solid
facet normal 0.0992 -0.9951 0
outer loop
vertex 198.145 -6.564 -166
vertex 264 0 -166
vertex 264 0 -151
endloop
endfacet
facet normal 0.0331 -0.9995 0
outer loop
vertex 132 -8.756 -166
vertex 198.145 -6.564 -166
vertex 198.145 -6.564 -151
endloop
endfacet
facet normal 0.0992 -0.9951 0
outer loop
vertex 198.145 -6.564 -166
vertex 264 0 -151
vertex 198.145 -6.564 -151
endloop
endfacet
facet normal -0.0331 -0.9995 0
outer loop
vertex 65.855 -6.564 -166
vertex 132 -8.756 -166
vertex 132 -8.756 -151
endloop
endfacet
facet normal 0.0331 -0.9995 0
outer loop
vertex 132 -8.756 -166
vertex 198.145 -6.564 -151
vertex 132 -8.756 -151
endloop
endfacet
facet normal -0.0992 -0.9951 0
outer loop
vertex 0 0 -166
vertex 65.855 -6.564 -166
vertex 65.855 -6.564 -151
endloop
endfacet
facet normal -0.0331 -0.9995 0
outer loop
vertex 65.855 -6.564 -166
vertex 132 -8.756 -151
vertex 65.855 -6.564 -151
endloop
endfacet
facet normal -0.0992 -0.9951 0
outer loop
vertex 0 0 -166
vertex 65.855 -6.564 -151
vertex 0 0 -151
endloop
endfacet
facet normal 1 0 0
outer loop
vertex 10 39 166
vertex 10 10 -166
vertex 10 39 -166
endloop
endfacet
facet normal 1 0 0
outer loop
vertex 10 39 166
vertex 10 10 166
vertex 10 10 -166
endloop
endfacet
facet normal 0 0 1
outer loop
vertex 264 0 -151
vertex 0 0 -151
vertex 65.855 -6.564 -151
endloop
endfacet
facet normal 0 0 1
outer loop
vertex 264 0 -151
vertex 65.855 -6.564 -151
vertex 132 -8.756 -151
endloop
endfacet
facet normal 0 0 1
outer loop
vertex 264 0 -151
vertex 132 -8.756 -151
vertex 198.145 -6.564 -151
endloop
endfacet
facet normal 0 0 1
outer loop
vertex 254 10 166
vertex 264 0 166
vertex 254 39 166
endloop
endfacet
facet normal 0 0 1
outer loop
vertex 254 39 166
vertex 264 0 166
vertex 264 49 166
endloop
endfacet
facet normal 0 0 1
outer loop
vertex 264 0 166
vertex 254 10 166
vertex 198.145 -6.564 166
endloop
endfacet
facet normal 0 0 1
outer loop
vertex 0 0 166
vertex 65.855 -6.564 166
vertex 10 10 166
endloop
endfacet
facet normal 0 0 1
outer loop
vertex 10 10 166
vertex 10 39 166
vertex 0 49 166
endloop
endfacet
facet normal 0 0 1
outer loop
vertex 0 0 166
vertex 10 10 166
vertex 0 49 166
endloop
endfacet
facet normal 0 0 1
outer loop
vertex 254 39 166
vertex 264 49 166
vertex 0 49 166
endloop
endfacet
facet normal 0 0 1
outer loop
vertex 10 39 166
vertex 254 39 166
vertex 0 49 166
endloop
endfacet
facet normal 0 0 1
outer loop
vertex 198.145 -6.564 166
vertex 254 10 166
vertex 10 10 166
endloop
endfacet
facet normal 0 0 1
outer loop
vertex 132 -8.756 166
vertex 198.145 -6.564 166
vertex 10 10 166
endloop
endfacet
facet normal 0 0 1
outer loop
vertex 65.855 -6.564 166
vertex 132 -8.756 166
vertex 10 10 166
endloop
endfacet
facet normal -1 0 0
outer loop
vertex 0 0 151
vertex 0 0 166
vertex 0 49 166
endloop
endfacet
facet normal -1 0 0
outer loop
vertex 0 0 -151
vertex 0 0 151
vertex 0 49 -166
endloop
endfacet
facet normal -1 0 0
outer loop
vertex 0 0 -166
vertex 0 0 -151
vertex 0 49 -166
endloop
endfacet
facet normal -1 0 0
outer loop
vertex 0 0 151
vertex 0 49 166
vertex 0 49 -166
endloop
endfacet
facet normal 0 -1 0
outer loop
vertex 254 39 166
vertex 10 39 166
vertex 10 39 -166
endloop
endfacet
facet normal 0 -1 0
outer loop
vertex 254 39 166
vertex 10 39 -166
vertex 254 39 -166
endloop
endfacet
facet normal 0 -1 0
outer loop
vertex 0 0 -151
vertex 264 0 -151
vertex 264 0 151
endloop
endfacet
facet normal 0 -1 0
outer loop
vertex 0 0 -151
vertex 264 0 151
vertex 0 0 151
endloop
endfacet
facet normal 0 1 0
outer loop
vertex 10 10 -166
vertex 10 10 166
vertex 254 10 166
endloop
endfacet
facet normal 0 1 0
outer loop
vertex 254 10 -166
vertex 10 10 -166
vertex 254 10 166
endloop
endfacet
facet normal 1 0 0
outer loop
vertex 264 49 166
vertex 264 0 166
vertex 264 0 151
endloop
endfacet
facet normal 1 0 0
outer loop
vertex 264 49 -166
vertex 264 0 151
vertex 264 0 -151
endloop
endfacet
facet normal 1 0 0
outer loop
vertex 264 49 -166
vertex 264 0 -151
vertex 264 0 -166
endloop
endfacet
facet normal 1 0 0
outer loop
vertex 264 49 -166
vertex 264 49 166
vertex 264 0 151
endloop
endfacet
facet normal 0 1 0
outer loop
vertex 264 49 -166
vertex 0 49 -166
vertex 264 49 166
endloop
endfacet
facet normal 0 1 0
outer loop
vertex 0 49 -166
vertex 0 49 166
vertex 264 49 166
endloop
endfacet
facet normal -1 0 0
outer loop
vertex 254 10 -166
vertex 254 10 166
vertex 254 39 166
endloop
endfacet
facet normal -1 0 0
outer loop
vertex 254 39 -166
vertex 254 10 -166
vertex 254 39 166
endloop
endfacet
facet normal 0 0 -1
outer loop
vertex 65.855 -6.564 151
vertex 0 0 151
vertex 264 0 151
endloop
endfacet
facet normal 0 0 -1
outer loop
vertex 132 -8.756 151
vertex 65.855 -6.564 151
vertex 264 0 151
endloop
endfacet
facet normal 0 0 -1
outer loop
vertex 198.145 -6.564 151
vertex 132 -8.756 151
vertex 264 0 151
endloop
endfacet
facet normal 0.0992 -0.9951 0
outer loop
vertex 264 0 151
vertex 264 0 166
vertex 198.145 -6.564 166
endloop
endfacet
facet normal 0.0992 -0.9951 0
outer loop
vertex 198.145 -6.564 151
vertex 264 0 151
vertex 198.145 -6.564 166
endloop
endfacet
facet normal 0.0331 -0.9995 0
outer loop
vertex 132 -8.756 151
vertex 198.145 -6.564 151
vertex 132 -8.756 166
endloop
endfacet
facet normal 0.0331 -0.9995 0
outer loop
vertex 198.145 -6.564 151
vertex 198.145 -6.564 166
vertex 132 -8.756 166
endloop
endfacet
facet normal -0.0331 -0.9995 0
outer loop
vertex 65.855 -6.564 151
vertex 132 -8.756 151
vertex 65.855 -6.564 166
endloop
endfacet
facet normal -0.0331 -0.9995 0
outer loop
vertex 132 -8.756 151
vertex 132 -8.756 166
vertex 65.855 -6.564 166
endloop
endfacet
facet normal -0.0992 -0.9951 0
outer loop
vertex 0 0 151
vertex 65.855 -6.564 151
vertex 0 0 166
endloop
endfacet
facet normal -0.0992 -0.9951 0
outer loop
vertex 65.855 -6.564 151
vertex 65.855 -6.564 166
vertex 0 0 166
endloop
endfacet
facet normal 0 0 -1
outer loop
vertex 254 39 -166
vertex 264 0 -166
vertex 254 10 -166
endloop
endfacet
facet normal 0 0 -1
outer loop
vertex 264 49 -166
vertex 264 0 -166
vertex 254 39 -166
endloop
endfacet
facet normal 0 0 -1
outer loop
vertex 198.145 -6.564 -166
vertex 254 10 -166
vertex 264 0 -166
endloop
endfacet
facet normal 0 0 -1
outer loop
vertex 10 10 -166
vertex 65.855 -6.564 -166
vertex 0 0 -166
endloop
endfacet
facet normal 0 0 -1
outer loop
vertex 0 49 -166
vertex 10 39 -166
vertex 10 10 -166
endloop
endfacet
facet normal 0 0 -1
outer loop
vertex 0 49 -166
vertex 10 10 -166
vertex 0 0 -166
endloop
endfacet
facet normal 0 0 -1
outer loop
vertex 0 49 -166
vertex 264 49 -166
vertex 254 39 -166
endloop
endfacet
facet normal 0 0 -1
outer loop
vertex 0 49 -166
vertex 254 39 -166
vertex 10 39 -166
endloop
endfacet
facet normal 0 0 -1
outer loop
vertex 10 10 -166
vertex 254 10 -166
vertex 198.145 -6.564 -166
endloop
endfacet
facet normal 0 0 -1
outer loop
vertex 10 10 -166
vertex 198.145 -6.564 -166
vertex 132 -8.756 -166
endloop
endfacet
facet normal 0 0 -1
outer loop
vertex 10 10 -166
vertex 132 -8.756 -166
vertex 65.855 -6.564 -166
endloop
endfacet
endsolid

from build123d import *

# Parameters (mm, degrees)
SKETCH1_W           = 244
SKETCH1_H           = 29
BOSS_EXTRUDE1_DEPTH = 166
SKETCH3_W           = 264
SKETCH3_H           = 30.556086773
CUT_EXTRUDE2_DEPTH  = 151
SKETCH4_W           = 264
SKETCH4_H           = 302
BOSS_EXTRUDE2_DEPTH = 10


with BuildPart() as part:
    # Sketch1 → Boss-Extrude1 (new, symmetric)
    with BuildSketch(Plane.XY):
        with BuildLine():
            Line((0, 0), (0, 49))
            Line((0, 49), (264, 49))
            Line((264, 49), (264, 0))
            ThreePointArc((264, 0), (132, -8.755804433), (0, 0))
        make_face()
        with Locations((132, 24.5)):
            Rectangle(SKETCH1_W, SKETCH1_H, mode=Mode.SUBTRACT)
    extrude(amount=BOSS_EXTRUDE1_DEPTH, both=True)

    # Sketch3 → Cut-Extrude2 (cut, symmetric)
    with BuildSketch(Plane.XY):
        with Locations((132, -5.278043387)):
            Rectangle(SKETCH3_W, SKETCH3_H)
    extrude(amount=CUT_EXTRUDE2_DEPTH, both=True, mode=Mode.SUBTRACT)

    # Sketch4 → Boss-Extrude2 (add)
    with BuildSketch(Plane(origin=(0, 10, 0), x_dir=(-1, 0, 0), z_dir=(0, -1, 0))):
        with Locations((-132, 0)):
            Rectangle(SKETCH4_W, SKETCH4_H)
    extrude(amount=BOSS_EXTRUDE2_DEPTH)


solid = part.part
